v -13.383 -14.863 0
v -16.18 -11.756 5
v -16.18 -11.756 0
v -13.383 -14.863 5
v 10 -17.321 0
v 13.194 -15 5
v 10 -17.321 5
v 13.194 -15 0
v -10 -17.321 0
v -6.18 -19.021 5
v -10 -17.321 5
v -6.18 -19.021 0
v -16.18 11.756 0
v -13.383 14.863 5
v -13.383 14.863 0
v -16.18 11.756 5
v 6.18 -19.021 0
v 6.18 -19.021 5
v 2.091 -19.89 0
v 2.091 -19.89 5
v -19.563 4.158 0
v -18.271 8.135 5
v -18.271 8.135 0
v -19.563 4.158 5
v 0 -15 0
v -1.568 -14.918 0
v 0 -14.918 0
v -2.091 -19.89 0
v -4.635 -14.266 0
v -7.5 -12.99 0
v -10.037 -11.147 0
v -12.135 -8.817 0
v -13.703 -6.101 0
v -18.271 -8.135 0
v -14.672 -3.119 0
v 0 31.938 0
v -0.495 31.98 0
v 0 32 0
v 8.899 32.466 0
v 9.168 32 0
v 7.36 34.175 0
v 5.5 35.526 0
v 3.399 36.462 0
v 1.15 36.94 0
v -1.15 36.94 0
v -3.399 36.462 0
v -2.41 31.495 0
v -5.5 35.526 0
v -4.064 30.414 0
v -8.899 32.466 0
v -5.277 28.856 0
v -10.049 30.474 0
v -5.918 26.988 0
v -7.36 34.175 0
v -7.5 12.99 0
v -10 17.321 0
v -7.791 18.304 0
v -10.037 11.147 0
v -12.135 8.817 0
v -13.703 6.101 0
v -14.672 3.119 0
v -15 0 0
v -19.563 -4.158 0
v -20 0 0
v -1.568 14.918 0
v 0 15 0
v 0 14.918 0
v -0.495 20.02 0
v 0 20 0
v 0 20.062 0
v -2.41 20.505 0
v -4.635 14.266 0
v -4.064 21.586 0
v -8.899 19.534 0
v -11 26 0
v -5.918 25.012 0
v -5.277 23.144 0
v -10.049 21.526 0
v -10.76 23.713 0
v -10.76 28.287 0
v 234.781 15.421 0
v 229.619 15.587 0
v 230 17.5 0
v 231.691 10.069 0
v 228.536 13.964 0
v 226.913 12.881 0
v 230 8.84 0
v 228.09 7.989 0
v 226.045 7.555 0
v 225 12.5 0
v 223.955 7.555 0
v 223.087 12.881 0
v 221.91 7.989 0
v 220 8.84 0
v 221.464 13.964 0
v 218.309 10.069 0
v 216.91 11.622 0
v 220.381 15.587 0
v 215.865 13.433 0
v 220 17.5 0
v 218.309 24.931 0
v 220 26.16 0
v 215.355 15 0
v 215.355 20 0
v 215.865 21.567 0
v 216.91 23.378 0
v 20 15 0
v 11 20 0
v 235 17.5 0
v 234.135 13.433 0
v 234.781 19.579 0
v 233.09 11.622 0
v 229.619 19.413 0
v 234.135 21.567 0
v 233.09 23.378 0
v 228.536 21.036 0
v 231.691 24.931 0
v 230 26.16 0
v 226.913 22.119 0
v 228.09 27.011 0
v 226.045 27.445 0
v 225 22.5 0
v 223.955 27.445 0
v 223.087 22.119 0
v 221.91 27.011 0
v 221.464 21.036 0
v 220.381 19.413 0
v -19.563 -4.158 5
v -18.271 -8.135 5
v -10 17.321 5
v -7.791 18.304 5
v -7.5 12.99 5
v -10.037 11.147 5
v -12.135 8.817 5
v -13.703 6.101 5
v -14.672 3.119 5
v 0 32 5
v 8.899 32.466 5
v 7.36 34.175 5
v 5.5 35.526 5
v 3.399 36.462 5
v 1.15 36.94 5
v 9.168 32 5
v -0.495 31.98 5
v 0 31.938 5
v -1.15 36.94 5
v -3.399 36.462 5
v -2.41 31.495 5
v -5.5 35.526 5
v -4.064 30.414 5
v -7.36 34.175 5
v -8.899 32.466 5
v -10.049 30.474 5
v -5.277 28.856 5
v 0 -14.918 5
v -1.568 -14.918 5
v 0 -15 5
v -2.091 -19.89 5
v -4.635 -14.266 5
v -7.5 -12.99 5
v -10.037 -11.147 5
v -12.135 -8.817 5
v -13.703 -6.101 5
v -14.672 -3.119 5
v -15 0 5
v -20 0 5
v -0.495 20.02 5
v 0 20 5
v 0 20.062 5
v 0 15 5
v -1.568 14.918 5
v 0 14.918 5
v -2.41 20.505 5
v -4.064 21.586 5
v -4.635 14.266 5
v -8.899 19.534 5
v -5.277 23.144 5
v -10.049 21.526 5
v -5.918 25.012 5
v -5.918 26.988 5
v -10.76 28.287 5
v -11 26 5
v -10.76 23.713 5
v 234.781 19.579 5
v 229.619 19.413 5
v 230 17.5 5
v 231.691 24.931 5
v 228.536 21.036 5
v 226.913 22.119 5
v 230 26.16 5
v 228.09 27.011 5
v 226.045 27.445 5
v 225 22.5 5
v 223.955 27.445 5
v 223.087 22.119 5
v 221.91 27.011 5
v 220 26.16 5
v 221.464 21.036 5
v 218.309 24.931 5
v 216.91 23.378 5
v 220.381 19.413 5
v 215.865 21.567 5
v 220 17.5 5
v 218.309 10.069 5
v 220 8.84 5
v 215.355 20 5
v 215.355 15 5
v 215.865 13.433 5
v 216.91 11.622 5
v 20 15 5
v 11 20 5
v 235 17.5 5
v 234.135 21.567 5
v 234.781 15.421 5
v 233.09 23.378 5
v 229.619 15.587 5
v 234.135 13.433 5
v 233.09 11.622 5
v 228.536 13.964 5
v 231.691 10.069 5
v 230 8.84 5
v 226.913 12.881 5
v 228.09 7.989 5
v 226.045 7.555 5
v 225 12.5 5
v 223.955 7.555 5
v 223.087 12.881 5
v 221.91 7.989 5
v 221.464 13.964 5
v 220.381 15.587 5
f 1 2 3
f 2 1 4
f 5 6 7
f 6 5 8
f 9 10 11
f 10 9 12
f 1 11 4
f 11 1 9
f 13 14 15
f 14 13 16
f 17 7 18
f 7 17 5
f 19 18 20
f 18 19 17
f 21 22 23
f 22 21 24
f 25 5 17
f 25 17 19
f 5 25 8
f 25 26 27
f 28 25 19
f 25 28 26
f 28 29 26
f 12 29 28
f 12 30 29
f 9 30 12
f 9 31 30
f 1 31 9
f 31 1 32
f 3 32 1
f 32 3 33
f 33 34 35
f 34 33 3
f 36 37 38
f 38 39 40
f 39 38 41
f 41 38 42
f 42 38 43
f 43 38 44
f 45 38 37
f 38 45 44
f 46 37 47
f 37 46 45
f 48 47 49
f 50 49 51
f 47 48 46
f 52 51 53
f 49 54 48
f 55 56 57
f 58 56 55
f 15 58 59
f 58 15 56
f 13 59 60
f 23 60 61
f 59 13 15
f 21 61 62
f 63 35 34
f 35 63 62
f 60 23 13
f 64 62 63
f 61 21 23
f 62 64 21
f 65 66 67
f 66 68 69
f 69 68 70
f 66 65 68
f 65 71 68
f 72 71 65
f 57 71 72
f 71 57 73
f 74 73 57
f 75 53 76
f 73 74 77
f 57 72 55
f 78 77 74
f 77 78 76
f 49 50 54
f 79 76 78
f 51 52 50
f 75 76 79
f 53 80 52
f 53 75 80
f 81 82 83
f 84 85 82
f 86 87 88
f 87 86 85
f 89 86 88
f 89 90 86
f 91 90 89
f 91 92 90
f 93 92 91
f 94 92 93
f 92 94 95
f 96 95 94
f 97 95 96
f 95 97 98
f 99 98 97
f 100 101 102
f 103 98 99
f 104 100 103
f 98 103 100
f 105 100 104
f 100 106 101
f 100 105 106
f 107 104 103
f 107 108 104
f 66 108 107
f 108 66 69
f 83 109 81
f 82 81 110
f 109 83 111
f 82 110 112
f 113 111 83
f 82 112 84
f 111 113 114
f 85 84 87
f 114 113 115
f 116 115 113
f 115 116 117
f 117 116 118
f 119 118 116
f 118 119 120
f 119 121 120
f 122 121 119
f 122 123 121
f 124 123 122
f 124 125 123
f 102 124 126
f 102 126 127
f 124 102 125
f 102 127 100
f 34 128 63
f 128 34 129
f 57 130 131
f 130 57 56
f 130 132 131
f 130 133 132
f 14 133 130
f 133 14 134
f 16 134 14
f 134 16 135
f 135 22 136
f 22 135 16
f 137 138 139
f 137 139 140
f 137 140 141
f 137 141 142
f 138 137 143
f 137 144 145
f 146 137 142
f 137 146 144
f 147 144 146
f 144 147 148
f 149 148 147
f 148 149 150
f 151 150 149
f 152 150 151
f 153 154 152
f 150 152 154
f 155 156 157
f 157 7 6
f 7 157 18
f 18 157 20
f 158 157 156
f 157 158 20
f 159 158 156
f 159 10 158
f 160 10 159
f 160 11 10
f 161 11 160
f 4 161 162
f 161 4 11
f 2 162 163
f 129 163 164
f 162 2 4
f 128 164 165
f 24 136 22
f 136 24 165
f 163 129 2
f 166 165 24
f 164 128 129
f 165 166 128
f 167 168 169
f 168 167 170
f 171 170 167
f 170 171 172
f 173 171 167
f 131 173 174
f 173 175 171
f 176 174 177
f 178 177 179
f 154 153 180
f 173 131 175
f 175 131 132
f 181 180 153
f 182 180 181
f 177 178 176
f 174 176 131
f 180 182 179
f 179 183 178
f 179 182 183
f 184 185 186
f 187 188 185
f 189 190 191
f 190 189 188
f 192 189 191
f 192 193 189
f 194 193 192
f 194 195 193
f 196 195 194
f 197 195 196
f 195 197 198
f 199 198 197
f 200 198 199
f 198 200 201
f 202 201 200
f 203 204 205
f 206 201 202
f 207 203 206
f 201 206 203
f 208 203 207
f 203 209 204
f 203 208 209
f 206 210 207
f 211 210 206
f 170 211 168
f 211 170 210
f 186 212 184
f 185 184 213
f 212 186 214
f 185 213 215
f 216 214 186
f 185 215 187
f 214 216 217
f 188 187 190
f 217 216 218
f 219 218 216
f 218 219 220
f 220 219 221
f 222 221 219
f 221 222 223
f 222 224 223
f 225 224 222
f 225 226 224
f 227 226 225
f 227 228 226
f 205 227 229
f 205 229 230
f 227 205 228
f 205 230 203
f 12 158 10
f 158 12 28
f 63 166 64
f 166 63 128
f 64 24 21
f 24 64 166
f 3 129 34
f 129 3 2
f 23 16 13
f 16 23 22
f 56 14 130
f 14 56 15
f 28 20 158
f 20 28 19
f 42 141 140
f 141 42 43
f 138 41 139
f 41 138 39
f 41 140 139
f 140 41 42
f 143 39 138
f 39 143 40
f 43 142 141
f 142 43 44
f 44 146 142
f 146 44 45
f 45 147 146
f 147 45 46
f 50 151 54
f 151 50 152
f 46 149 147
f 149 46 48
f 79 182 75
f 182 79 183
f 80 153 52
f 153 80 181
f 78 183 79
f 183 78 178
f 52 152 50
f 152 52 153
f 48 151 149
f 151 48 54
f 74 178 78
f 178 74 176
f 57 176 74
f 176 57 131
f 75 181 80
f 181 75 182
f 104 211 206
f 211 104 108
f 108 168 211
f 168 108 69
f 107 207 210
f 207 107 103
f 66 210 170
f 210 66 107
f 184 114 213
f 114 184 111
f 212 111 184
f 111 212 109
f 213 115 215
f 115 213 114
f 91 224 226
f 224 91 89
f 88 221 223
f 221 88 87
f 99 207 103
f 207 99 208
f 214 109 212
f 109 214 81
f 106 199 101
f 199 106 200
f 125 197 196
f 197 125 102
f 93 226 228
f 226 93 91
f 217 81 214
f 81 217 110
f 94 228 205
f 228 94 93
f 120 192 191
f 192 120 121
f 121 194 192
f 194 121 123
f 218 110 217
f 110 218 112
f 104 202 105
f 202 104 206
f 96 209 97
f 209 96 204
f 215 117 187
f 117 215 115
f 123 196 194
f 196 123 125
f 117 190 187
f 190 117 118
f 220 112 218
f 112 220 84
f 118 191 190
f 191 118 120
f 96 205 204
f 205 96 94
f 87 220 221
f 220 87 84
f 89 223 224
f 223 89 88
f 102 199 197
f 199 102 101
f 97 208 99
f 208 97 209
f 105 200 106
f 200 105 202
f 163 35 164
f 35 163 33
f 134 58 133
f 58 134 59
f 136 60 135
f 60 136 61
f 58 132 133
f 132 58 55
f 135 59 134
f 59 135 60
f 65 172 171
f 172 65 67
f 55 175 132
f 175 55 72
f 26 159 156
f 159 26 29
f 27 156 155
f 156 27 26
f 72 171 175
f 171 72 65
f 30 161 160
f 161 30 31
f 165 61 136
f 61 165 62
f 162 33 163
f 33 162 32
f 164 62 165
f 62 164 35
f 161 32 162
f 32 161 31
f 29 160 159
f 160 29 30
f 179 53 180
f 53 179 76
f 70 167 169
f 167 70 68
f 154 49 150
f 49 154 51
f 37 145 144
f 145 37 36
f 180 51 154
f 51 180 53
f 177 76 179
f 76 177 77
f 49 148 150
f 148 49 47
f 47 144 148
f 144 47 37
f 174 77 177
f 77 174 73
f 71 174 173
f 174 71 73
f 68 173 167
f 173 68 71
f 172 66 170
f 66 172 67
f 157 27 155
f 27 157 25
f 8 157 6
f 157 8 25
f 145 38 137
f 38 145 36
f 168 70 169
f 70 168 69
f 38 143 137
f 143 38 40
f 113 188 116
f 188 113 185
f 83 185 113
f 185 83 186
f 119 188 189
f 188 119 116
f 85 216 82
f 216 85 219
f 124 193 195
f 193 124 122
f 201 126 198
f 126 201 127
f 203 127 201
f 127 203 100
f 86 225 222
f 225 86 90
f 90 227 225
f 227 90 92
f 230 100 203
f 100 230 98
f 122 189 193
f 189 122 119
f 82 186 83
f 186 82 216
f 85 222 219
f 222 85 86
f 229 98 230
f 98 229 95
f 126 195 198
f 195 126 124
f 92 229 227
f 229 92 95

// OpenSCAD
d1 = 30;
d2 = 12;
t1 = 5;
t2 = 5;
l1 = 225;

difference() {
    pos1();
    neg1();
}

module pos1() {
    cylinder(d=d1+2*t2, h=t1);
    translate([0, (d1+d2)/2+t2, 0]) cylinder(d=d2+2*t2, h=t1);
    translate([0, d1/2, 0]) cube([l1, t2, t1]);
    translate([l1, d1/2+t1/2, 0]) cylinder(d=20, h=t1);
}

module neg1() {
    cylinder(d=d1, h=t1);
    translate([0, (d1+d2)/2+t2, 0]) cylinder(d=d2, h=t1);
    translate([0, -(d1/2), 0]) cube([d1/2+t2, d1, t1]);
    translate([0, d1/2+t1, 0]) cube([d2/2+t2, d2, t1]);
    #translate([l1, d1/2+t1/2, 0]) cylinder(d=10, h=t1);
}
